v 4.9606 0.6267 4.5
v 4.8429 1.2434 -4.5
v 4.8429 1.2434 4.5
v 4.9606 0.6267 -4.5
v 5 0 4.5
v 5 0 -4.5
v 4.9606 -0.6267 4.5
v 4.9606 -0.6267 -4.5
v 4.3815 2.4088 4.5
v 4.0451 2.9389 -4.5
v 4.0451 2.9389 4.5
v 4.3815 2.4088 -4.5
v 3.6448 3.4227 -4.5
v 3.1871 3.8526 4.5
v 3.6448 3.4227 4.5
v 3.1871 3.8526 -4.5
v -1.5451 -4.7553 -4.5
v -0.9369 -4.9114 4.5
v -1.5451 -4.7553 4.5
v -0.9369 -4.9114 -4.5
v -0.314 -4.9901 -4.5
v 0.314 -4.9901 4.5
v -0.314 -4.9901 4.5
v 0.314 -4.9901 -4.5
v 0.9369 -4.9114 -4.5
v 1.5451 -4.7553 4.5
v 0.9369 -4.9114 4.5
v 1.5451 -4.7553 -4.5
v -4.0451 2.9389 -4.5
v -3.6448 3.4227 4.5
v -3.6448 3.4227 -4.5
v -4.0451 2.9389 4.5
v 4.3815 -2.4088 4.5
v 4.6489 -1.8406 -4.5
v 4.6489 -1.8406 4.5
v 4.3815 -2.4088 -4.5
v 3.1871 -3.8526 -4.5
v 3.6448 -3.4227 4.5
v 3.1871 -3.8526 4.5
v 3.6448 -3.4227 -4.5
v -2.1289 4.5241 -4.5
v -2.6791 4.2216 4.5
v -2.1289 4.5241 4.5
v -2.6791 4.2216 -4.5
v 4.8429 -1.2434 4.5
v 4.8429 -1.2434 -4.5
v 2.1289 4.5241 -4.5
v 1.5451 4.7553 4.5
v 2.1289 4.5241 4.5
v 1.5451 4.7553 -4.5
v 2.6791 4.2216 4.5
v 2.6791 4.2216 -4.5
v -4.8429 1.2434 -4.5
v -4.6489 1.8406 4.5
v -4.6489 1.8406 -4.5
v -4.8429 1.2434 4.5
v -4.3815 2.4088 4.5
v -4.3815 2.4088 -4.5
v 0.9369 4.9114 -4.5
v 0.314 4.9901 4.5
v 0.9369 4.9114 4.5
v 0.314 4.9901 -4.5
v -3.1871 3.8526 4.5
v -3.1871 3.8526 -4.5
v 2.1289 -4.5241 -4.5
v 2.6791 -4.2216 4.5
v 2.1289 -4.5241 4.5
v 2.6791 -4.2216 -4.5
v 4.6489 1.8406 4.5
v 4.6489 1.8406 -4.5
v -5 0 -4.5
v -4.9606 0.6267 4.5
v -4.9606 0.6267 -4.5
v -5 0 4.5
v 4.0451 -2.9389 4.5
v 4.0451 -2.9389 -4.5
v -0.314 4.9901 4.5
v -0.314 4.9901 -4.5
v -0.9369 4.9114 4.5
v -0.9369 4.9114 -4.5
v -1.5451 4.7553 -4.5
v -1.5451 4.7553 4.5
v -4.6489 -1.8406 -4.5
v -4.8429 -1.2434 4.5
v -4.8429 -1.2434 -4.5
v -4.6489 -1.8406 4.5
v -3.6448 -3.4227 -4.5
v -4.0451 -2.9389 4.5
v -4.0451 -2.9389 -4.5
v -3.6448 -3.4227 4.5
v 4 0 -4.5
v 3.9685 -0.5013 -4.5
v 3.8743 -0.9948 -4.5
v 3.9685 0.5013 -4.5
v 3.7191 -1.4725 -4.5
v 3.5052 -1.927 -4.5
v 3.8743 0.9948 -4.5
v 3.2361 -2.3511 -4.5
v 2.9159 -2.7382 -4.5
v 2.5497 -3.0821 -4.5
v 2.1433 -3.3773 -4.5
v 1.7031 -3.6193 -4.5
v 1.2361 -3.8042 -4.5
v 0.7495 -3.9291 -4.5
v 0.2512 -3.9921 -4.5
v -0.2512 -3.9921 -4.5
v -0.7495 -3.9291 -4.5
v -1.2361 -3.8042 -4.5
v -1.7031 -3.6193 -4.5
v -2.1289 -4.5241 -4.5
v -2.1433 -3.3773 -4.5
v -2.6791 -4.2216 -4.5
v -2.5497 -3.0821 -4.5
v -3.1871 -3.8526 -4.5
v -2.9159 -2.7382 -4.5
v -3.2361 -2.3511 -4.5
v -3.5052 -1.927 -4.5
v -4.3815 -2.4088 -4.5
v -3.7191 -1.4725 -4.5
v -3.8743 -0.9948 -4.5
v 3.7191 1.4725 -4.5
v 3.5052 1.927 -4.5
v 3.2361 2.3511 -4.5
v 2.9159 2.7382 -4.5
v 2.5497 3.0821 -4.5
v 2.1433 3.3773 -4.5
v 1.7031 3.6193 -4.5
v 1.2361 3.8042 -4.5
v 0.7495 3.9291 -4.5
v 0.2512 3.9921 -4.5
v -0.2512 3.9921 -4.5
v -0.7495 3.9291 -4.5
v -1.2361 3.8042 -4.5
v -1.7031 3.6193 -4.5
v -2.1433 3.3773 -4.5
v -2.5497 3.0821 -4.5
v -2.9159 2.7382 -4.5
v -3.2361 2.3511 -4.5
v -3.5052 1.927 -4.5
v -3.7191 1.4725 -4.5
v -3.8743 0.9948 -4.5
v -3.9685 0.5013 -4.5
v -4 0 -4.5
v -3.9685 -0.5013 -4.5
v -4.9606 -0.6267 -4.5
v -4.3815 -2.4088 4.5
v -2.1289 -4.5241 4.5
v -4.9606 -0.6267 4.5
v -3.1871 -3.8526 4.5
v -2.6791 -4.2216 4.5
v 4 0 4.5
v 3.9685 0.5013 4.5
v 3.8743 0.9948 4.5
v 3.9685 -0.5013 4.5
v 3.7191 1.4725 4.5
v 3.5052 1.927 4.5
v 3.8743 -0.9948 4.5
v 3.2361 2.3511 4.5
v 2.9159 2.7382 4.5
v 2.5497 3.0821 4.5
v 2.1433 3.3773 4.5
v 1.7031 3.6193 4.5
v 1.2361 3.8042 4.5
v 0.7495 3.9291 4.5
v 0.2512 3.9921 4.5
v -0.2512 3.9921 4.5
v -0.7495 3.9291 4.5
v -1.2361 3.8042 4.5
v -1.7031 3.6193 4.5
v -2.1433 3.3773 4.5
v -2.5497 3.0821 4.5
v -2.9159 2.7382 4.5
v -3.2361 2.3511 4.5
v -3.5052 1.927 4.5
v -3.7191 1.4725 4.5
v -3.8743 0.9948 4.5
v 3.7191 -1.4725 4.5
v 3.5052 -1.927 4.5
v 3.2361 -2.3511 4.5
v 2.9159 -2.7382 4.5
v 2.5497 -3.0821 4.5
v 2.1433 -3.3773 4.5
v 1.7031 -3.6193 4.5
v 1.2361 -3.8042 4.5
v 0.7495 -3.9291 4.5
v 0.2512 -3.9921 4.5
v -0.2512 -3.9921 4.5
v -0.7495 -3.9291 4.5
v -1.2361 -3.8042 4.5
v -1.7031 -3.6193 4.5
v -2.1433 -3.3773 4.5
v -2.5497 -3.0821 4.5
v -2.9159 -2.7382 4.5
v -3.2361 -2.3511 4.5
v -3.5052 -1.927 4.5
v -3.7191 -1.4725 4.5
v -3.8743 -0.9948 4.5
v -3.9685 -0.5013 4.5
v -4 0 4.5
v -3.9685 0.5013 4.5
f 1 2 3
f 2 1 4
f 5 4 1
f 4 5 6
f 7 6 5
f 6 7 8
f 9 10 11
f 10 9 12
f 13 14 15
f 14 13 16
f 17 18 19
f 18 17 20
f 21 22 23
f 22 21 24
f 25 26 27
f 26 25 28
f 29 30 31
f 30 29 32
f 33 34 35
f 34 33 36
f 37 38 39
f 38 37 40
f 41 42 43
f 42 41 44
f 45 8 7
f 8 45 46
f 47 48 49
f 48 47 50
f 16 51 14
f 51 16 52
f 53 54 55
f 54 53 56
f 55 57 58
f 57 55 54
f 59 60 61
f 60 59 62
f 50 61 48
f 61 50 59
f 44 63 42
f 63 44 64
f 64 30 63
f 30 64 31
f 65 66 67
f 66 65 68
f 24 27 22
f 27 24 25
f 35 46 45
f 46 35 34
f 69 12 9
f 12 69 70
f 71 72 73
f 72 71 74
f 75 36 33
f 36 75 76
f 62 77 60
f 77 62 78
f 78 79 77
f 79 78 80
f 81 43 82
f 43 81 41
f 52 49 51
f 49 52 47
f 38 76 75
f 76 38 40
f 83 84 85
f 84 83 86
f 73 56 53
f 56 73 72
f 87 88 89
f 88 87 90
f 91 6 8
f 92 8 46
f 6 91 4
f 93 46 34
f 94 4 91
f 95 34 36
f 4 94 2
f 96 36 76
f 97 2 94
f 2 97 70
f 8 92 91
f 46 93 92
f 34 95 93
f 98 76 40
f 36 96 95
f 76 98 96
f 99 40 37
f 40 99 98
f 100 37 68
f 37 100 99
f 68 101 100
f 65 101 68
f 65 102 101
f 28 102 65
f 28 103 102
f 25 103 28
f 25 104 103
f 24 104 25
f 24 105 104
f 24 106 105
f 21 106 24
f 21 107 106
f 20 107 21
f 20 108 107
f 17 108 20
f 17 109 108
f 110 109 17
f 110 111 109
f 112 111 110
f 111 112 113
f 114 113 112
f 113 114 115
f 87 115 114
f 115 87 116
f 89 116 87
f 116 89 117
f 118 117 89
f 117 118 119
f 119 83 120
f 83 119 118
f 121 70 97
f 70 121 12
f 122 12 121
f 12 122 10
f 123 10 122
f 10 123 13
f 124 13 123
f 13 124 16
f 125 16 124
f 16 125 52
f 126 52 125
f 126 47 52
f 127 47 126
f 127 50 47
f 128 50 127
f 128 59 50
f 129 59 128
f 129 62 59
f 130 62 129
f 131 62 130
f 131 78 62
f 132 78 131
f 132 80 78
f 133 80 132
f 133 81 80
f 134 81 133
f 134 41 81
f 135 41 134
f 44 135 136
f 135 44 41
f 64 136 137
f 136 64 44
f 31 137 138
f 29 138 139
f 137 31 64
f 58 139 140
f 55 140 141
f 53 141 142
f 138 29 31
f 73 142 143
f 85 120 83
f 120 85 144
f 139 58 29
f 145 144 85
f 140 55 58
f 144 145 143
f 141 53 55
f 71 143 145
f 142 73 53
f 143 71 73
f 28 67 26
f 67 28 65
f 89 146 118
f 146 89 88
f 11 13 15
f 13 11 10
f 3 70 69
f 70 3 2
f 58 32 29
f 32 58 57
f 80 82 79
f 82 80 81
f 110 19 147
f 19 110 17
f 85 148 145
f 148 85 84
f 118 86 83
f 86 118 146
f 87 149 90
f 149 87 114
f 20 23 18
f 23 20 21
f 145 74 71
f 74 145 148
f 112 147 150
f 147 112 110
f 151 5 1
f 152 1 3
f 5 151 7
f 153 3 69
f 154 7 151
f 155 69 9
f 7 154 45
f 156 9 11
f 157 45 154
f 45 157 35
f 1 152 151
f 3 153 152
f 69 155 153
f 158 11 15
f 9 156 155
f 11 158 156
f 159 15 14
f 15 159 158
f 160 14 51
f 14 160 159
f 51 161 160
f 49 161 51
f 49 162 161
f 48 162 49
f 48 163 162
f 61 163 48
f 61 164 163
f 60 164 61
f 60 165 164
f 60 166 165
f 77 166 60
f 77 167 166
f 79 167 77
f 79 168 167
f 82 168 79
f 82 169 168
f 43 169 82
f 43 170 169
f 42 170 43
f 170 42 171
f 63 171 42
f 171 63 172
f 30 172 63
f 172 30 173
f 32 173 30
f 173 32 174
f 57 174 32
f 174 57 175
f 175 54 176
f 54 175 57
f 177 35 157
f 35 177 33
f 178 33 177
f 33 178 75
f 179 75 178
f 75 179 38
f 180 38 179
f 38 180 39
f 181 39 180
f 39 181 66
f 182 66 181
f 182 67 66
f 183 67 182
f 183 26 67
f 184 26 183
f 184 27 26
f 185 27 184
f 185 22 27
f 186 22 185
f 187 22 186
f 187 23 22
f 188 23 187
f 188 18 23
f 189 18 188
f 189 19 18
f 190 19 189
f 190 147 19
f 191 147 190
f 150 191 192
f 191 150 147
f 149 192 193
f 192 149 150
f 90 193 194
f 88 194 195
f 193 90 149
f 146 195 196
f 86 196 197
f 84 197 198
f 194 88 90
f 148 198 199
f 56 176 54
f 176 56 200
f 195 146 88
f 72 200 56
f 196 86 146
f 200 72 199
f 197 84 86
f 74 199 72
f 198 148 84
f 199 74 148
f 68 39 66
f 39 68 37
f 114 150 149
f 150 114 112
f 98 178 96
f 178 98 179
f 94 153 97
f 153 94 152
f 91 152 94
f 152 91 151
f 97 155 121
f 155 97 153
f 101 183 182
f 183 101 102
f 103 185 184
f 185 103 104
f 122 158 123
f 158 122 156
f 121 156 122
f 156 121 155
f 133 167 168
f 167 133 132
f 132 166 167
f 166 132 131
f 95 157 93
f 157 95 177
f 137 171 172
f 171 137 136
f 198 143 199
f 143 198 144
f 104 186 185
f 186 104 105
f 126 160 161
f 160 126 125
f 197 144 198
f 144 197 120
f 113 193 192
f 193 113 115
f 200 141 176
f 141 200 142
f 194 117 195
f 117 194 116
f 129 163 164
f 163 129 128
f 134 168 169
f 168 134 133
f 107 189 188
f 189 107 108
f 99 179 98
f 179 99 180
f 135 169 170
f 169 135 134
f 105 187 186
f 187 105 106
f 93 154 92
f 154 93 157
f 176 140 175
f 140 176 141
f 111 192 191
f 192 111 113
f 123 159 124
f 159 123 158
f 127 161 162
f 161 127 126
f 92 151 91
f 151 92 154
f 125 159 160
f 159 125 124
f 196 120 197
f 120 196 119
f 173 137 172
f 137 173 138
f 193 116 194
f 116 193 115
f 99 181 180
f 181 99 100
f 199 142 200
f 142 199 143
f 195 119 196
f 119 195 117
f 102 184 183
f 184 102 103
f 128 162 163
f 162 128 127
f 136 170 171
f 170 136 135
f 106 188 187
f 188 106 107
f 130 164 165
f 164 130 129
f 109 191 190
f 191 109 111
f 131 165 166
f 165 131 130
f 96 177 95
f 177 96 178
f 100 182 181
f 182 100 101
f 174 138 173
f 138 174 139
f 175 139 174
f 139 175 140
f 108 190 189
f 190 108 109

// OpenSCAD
$fn = 50;


difference() {
	union() {
		translate(v = [0, 0, -4.5000000000]) {
			cylinder(h = 9, r = 5.0000000000);
		}
	}
	union() {
		translate(v = [0, 0, -100.0000000000]) {
			cylinder(h = 200, r = 4.0000000000);
		}
	}
}
